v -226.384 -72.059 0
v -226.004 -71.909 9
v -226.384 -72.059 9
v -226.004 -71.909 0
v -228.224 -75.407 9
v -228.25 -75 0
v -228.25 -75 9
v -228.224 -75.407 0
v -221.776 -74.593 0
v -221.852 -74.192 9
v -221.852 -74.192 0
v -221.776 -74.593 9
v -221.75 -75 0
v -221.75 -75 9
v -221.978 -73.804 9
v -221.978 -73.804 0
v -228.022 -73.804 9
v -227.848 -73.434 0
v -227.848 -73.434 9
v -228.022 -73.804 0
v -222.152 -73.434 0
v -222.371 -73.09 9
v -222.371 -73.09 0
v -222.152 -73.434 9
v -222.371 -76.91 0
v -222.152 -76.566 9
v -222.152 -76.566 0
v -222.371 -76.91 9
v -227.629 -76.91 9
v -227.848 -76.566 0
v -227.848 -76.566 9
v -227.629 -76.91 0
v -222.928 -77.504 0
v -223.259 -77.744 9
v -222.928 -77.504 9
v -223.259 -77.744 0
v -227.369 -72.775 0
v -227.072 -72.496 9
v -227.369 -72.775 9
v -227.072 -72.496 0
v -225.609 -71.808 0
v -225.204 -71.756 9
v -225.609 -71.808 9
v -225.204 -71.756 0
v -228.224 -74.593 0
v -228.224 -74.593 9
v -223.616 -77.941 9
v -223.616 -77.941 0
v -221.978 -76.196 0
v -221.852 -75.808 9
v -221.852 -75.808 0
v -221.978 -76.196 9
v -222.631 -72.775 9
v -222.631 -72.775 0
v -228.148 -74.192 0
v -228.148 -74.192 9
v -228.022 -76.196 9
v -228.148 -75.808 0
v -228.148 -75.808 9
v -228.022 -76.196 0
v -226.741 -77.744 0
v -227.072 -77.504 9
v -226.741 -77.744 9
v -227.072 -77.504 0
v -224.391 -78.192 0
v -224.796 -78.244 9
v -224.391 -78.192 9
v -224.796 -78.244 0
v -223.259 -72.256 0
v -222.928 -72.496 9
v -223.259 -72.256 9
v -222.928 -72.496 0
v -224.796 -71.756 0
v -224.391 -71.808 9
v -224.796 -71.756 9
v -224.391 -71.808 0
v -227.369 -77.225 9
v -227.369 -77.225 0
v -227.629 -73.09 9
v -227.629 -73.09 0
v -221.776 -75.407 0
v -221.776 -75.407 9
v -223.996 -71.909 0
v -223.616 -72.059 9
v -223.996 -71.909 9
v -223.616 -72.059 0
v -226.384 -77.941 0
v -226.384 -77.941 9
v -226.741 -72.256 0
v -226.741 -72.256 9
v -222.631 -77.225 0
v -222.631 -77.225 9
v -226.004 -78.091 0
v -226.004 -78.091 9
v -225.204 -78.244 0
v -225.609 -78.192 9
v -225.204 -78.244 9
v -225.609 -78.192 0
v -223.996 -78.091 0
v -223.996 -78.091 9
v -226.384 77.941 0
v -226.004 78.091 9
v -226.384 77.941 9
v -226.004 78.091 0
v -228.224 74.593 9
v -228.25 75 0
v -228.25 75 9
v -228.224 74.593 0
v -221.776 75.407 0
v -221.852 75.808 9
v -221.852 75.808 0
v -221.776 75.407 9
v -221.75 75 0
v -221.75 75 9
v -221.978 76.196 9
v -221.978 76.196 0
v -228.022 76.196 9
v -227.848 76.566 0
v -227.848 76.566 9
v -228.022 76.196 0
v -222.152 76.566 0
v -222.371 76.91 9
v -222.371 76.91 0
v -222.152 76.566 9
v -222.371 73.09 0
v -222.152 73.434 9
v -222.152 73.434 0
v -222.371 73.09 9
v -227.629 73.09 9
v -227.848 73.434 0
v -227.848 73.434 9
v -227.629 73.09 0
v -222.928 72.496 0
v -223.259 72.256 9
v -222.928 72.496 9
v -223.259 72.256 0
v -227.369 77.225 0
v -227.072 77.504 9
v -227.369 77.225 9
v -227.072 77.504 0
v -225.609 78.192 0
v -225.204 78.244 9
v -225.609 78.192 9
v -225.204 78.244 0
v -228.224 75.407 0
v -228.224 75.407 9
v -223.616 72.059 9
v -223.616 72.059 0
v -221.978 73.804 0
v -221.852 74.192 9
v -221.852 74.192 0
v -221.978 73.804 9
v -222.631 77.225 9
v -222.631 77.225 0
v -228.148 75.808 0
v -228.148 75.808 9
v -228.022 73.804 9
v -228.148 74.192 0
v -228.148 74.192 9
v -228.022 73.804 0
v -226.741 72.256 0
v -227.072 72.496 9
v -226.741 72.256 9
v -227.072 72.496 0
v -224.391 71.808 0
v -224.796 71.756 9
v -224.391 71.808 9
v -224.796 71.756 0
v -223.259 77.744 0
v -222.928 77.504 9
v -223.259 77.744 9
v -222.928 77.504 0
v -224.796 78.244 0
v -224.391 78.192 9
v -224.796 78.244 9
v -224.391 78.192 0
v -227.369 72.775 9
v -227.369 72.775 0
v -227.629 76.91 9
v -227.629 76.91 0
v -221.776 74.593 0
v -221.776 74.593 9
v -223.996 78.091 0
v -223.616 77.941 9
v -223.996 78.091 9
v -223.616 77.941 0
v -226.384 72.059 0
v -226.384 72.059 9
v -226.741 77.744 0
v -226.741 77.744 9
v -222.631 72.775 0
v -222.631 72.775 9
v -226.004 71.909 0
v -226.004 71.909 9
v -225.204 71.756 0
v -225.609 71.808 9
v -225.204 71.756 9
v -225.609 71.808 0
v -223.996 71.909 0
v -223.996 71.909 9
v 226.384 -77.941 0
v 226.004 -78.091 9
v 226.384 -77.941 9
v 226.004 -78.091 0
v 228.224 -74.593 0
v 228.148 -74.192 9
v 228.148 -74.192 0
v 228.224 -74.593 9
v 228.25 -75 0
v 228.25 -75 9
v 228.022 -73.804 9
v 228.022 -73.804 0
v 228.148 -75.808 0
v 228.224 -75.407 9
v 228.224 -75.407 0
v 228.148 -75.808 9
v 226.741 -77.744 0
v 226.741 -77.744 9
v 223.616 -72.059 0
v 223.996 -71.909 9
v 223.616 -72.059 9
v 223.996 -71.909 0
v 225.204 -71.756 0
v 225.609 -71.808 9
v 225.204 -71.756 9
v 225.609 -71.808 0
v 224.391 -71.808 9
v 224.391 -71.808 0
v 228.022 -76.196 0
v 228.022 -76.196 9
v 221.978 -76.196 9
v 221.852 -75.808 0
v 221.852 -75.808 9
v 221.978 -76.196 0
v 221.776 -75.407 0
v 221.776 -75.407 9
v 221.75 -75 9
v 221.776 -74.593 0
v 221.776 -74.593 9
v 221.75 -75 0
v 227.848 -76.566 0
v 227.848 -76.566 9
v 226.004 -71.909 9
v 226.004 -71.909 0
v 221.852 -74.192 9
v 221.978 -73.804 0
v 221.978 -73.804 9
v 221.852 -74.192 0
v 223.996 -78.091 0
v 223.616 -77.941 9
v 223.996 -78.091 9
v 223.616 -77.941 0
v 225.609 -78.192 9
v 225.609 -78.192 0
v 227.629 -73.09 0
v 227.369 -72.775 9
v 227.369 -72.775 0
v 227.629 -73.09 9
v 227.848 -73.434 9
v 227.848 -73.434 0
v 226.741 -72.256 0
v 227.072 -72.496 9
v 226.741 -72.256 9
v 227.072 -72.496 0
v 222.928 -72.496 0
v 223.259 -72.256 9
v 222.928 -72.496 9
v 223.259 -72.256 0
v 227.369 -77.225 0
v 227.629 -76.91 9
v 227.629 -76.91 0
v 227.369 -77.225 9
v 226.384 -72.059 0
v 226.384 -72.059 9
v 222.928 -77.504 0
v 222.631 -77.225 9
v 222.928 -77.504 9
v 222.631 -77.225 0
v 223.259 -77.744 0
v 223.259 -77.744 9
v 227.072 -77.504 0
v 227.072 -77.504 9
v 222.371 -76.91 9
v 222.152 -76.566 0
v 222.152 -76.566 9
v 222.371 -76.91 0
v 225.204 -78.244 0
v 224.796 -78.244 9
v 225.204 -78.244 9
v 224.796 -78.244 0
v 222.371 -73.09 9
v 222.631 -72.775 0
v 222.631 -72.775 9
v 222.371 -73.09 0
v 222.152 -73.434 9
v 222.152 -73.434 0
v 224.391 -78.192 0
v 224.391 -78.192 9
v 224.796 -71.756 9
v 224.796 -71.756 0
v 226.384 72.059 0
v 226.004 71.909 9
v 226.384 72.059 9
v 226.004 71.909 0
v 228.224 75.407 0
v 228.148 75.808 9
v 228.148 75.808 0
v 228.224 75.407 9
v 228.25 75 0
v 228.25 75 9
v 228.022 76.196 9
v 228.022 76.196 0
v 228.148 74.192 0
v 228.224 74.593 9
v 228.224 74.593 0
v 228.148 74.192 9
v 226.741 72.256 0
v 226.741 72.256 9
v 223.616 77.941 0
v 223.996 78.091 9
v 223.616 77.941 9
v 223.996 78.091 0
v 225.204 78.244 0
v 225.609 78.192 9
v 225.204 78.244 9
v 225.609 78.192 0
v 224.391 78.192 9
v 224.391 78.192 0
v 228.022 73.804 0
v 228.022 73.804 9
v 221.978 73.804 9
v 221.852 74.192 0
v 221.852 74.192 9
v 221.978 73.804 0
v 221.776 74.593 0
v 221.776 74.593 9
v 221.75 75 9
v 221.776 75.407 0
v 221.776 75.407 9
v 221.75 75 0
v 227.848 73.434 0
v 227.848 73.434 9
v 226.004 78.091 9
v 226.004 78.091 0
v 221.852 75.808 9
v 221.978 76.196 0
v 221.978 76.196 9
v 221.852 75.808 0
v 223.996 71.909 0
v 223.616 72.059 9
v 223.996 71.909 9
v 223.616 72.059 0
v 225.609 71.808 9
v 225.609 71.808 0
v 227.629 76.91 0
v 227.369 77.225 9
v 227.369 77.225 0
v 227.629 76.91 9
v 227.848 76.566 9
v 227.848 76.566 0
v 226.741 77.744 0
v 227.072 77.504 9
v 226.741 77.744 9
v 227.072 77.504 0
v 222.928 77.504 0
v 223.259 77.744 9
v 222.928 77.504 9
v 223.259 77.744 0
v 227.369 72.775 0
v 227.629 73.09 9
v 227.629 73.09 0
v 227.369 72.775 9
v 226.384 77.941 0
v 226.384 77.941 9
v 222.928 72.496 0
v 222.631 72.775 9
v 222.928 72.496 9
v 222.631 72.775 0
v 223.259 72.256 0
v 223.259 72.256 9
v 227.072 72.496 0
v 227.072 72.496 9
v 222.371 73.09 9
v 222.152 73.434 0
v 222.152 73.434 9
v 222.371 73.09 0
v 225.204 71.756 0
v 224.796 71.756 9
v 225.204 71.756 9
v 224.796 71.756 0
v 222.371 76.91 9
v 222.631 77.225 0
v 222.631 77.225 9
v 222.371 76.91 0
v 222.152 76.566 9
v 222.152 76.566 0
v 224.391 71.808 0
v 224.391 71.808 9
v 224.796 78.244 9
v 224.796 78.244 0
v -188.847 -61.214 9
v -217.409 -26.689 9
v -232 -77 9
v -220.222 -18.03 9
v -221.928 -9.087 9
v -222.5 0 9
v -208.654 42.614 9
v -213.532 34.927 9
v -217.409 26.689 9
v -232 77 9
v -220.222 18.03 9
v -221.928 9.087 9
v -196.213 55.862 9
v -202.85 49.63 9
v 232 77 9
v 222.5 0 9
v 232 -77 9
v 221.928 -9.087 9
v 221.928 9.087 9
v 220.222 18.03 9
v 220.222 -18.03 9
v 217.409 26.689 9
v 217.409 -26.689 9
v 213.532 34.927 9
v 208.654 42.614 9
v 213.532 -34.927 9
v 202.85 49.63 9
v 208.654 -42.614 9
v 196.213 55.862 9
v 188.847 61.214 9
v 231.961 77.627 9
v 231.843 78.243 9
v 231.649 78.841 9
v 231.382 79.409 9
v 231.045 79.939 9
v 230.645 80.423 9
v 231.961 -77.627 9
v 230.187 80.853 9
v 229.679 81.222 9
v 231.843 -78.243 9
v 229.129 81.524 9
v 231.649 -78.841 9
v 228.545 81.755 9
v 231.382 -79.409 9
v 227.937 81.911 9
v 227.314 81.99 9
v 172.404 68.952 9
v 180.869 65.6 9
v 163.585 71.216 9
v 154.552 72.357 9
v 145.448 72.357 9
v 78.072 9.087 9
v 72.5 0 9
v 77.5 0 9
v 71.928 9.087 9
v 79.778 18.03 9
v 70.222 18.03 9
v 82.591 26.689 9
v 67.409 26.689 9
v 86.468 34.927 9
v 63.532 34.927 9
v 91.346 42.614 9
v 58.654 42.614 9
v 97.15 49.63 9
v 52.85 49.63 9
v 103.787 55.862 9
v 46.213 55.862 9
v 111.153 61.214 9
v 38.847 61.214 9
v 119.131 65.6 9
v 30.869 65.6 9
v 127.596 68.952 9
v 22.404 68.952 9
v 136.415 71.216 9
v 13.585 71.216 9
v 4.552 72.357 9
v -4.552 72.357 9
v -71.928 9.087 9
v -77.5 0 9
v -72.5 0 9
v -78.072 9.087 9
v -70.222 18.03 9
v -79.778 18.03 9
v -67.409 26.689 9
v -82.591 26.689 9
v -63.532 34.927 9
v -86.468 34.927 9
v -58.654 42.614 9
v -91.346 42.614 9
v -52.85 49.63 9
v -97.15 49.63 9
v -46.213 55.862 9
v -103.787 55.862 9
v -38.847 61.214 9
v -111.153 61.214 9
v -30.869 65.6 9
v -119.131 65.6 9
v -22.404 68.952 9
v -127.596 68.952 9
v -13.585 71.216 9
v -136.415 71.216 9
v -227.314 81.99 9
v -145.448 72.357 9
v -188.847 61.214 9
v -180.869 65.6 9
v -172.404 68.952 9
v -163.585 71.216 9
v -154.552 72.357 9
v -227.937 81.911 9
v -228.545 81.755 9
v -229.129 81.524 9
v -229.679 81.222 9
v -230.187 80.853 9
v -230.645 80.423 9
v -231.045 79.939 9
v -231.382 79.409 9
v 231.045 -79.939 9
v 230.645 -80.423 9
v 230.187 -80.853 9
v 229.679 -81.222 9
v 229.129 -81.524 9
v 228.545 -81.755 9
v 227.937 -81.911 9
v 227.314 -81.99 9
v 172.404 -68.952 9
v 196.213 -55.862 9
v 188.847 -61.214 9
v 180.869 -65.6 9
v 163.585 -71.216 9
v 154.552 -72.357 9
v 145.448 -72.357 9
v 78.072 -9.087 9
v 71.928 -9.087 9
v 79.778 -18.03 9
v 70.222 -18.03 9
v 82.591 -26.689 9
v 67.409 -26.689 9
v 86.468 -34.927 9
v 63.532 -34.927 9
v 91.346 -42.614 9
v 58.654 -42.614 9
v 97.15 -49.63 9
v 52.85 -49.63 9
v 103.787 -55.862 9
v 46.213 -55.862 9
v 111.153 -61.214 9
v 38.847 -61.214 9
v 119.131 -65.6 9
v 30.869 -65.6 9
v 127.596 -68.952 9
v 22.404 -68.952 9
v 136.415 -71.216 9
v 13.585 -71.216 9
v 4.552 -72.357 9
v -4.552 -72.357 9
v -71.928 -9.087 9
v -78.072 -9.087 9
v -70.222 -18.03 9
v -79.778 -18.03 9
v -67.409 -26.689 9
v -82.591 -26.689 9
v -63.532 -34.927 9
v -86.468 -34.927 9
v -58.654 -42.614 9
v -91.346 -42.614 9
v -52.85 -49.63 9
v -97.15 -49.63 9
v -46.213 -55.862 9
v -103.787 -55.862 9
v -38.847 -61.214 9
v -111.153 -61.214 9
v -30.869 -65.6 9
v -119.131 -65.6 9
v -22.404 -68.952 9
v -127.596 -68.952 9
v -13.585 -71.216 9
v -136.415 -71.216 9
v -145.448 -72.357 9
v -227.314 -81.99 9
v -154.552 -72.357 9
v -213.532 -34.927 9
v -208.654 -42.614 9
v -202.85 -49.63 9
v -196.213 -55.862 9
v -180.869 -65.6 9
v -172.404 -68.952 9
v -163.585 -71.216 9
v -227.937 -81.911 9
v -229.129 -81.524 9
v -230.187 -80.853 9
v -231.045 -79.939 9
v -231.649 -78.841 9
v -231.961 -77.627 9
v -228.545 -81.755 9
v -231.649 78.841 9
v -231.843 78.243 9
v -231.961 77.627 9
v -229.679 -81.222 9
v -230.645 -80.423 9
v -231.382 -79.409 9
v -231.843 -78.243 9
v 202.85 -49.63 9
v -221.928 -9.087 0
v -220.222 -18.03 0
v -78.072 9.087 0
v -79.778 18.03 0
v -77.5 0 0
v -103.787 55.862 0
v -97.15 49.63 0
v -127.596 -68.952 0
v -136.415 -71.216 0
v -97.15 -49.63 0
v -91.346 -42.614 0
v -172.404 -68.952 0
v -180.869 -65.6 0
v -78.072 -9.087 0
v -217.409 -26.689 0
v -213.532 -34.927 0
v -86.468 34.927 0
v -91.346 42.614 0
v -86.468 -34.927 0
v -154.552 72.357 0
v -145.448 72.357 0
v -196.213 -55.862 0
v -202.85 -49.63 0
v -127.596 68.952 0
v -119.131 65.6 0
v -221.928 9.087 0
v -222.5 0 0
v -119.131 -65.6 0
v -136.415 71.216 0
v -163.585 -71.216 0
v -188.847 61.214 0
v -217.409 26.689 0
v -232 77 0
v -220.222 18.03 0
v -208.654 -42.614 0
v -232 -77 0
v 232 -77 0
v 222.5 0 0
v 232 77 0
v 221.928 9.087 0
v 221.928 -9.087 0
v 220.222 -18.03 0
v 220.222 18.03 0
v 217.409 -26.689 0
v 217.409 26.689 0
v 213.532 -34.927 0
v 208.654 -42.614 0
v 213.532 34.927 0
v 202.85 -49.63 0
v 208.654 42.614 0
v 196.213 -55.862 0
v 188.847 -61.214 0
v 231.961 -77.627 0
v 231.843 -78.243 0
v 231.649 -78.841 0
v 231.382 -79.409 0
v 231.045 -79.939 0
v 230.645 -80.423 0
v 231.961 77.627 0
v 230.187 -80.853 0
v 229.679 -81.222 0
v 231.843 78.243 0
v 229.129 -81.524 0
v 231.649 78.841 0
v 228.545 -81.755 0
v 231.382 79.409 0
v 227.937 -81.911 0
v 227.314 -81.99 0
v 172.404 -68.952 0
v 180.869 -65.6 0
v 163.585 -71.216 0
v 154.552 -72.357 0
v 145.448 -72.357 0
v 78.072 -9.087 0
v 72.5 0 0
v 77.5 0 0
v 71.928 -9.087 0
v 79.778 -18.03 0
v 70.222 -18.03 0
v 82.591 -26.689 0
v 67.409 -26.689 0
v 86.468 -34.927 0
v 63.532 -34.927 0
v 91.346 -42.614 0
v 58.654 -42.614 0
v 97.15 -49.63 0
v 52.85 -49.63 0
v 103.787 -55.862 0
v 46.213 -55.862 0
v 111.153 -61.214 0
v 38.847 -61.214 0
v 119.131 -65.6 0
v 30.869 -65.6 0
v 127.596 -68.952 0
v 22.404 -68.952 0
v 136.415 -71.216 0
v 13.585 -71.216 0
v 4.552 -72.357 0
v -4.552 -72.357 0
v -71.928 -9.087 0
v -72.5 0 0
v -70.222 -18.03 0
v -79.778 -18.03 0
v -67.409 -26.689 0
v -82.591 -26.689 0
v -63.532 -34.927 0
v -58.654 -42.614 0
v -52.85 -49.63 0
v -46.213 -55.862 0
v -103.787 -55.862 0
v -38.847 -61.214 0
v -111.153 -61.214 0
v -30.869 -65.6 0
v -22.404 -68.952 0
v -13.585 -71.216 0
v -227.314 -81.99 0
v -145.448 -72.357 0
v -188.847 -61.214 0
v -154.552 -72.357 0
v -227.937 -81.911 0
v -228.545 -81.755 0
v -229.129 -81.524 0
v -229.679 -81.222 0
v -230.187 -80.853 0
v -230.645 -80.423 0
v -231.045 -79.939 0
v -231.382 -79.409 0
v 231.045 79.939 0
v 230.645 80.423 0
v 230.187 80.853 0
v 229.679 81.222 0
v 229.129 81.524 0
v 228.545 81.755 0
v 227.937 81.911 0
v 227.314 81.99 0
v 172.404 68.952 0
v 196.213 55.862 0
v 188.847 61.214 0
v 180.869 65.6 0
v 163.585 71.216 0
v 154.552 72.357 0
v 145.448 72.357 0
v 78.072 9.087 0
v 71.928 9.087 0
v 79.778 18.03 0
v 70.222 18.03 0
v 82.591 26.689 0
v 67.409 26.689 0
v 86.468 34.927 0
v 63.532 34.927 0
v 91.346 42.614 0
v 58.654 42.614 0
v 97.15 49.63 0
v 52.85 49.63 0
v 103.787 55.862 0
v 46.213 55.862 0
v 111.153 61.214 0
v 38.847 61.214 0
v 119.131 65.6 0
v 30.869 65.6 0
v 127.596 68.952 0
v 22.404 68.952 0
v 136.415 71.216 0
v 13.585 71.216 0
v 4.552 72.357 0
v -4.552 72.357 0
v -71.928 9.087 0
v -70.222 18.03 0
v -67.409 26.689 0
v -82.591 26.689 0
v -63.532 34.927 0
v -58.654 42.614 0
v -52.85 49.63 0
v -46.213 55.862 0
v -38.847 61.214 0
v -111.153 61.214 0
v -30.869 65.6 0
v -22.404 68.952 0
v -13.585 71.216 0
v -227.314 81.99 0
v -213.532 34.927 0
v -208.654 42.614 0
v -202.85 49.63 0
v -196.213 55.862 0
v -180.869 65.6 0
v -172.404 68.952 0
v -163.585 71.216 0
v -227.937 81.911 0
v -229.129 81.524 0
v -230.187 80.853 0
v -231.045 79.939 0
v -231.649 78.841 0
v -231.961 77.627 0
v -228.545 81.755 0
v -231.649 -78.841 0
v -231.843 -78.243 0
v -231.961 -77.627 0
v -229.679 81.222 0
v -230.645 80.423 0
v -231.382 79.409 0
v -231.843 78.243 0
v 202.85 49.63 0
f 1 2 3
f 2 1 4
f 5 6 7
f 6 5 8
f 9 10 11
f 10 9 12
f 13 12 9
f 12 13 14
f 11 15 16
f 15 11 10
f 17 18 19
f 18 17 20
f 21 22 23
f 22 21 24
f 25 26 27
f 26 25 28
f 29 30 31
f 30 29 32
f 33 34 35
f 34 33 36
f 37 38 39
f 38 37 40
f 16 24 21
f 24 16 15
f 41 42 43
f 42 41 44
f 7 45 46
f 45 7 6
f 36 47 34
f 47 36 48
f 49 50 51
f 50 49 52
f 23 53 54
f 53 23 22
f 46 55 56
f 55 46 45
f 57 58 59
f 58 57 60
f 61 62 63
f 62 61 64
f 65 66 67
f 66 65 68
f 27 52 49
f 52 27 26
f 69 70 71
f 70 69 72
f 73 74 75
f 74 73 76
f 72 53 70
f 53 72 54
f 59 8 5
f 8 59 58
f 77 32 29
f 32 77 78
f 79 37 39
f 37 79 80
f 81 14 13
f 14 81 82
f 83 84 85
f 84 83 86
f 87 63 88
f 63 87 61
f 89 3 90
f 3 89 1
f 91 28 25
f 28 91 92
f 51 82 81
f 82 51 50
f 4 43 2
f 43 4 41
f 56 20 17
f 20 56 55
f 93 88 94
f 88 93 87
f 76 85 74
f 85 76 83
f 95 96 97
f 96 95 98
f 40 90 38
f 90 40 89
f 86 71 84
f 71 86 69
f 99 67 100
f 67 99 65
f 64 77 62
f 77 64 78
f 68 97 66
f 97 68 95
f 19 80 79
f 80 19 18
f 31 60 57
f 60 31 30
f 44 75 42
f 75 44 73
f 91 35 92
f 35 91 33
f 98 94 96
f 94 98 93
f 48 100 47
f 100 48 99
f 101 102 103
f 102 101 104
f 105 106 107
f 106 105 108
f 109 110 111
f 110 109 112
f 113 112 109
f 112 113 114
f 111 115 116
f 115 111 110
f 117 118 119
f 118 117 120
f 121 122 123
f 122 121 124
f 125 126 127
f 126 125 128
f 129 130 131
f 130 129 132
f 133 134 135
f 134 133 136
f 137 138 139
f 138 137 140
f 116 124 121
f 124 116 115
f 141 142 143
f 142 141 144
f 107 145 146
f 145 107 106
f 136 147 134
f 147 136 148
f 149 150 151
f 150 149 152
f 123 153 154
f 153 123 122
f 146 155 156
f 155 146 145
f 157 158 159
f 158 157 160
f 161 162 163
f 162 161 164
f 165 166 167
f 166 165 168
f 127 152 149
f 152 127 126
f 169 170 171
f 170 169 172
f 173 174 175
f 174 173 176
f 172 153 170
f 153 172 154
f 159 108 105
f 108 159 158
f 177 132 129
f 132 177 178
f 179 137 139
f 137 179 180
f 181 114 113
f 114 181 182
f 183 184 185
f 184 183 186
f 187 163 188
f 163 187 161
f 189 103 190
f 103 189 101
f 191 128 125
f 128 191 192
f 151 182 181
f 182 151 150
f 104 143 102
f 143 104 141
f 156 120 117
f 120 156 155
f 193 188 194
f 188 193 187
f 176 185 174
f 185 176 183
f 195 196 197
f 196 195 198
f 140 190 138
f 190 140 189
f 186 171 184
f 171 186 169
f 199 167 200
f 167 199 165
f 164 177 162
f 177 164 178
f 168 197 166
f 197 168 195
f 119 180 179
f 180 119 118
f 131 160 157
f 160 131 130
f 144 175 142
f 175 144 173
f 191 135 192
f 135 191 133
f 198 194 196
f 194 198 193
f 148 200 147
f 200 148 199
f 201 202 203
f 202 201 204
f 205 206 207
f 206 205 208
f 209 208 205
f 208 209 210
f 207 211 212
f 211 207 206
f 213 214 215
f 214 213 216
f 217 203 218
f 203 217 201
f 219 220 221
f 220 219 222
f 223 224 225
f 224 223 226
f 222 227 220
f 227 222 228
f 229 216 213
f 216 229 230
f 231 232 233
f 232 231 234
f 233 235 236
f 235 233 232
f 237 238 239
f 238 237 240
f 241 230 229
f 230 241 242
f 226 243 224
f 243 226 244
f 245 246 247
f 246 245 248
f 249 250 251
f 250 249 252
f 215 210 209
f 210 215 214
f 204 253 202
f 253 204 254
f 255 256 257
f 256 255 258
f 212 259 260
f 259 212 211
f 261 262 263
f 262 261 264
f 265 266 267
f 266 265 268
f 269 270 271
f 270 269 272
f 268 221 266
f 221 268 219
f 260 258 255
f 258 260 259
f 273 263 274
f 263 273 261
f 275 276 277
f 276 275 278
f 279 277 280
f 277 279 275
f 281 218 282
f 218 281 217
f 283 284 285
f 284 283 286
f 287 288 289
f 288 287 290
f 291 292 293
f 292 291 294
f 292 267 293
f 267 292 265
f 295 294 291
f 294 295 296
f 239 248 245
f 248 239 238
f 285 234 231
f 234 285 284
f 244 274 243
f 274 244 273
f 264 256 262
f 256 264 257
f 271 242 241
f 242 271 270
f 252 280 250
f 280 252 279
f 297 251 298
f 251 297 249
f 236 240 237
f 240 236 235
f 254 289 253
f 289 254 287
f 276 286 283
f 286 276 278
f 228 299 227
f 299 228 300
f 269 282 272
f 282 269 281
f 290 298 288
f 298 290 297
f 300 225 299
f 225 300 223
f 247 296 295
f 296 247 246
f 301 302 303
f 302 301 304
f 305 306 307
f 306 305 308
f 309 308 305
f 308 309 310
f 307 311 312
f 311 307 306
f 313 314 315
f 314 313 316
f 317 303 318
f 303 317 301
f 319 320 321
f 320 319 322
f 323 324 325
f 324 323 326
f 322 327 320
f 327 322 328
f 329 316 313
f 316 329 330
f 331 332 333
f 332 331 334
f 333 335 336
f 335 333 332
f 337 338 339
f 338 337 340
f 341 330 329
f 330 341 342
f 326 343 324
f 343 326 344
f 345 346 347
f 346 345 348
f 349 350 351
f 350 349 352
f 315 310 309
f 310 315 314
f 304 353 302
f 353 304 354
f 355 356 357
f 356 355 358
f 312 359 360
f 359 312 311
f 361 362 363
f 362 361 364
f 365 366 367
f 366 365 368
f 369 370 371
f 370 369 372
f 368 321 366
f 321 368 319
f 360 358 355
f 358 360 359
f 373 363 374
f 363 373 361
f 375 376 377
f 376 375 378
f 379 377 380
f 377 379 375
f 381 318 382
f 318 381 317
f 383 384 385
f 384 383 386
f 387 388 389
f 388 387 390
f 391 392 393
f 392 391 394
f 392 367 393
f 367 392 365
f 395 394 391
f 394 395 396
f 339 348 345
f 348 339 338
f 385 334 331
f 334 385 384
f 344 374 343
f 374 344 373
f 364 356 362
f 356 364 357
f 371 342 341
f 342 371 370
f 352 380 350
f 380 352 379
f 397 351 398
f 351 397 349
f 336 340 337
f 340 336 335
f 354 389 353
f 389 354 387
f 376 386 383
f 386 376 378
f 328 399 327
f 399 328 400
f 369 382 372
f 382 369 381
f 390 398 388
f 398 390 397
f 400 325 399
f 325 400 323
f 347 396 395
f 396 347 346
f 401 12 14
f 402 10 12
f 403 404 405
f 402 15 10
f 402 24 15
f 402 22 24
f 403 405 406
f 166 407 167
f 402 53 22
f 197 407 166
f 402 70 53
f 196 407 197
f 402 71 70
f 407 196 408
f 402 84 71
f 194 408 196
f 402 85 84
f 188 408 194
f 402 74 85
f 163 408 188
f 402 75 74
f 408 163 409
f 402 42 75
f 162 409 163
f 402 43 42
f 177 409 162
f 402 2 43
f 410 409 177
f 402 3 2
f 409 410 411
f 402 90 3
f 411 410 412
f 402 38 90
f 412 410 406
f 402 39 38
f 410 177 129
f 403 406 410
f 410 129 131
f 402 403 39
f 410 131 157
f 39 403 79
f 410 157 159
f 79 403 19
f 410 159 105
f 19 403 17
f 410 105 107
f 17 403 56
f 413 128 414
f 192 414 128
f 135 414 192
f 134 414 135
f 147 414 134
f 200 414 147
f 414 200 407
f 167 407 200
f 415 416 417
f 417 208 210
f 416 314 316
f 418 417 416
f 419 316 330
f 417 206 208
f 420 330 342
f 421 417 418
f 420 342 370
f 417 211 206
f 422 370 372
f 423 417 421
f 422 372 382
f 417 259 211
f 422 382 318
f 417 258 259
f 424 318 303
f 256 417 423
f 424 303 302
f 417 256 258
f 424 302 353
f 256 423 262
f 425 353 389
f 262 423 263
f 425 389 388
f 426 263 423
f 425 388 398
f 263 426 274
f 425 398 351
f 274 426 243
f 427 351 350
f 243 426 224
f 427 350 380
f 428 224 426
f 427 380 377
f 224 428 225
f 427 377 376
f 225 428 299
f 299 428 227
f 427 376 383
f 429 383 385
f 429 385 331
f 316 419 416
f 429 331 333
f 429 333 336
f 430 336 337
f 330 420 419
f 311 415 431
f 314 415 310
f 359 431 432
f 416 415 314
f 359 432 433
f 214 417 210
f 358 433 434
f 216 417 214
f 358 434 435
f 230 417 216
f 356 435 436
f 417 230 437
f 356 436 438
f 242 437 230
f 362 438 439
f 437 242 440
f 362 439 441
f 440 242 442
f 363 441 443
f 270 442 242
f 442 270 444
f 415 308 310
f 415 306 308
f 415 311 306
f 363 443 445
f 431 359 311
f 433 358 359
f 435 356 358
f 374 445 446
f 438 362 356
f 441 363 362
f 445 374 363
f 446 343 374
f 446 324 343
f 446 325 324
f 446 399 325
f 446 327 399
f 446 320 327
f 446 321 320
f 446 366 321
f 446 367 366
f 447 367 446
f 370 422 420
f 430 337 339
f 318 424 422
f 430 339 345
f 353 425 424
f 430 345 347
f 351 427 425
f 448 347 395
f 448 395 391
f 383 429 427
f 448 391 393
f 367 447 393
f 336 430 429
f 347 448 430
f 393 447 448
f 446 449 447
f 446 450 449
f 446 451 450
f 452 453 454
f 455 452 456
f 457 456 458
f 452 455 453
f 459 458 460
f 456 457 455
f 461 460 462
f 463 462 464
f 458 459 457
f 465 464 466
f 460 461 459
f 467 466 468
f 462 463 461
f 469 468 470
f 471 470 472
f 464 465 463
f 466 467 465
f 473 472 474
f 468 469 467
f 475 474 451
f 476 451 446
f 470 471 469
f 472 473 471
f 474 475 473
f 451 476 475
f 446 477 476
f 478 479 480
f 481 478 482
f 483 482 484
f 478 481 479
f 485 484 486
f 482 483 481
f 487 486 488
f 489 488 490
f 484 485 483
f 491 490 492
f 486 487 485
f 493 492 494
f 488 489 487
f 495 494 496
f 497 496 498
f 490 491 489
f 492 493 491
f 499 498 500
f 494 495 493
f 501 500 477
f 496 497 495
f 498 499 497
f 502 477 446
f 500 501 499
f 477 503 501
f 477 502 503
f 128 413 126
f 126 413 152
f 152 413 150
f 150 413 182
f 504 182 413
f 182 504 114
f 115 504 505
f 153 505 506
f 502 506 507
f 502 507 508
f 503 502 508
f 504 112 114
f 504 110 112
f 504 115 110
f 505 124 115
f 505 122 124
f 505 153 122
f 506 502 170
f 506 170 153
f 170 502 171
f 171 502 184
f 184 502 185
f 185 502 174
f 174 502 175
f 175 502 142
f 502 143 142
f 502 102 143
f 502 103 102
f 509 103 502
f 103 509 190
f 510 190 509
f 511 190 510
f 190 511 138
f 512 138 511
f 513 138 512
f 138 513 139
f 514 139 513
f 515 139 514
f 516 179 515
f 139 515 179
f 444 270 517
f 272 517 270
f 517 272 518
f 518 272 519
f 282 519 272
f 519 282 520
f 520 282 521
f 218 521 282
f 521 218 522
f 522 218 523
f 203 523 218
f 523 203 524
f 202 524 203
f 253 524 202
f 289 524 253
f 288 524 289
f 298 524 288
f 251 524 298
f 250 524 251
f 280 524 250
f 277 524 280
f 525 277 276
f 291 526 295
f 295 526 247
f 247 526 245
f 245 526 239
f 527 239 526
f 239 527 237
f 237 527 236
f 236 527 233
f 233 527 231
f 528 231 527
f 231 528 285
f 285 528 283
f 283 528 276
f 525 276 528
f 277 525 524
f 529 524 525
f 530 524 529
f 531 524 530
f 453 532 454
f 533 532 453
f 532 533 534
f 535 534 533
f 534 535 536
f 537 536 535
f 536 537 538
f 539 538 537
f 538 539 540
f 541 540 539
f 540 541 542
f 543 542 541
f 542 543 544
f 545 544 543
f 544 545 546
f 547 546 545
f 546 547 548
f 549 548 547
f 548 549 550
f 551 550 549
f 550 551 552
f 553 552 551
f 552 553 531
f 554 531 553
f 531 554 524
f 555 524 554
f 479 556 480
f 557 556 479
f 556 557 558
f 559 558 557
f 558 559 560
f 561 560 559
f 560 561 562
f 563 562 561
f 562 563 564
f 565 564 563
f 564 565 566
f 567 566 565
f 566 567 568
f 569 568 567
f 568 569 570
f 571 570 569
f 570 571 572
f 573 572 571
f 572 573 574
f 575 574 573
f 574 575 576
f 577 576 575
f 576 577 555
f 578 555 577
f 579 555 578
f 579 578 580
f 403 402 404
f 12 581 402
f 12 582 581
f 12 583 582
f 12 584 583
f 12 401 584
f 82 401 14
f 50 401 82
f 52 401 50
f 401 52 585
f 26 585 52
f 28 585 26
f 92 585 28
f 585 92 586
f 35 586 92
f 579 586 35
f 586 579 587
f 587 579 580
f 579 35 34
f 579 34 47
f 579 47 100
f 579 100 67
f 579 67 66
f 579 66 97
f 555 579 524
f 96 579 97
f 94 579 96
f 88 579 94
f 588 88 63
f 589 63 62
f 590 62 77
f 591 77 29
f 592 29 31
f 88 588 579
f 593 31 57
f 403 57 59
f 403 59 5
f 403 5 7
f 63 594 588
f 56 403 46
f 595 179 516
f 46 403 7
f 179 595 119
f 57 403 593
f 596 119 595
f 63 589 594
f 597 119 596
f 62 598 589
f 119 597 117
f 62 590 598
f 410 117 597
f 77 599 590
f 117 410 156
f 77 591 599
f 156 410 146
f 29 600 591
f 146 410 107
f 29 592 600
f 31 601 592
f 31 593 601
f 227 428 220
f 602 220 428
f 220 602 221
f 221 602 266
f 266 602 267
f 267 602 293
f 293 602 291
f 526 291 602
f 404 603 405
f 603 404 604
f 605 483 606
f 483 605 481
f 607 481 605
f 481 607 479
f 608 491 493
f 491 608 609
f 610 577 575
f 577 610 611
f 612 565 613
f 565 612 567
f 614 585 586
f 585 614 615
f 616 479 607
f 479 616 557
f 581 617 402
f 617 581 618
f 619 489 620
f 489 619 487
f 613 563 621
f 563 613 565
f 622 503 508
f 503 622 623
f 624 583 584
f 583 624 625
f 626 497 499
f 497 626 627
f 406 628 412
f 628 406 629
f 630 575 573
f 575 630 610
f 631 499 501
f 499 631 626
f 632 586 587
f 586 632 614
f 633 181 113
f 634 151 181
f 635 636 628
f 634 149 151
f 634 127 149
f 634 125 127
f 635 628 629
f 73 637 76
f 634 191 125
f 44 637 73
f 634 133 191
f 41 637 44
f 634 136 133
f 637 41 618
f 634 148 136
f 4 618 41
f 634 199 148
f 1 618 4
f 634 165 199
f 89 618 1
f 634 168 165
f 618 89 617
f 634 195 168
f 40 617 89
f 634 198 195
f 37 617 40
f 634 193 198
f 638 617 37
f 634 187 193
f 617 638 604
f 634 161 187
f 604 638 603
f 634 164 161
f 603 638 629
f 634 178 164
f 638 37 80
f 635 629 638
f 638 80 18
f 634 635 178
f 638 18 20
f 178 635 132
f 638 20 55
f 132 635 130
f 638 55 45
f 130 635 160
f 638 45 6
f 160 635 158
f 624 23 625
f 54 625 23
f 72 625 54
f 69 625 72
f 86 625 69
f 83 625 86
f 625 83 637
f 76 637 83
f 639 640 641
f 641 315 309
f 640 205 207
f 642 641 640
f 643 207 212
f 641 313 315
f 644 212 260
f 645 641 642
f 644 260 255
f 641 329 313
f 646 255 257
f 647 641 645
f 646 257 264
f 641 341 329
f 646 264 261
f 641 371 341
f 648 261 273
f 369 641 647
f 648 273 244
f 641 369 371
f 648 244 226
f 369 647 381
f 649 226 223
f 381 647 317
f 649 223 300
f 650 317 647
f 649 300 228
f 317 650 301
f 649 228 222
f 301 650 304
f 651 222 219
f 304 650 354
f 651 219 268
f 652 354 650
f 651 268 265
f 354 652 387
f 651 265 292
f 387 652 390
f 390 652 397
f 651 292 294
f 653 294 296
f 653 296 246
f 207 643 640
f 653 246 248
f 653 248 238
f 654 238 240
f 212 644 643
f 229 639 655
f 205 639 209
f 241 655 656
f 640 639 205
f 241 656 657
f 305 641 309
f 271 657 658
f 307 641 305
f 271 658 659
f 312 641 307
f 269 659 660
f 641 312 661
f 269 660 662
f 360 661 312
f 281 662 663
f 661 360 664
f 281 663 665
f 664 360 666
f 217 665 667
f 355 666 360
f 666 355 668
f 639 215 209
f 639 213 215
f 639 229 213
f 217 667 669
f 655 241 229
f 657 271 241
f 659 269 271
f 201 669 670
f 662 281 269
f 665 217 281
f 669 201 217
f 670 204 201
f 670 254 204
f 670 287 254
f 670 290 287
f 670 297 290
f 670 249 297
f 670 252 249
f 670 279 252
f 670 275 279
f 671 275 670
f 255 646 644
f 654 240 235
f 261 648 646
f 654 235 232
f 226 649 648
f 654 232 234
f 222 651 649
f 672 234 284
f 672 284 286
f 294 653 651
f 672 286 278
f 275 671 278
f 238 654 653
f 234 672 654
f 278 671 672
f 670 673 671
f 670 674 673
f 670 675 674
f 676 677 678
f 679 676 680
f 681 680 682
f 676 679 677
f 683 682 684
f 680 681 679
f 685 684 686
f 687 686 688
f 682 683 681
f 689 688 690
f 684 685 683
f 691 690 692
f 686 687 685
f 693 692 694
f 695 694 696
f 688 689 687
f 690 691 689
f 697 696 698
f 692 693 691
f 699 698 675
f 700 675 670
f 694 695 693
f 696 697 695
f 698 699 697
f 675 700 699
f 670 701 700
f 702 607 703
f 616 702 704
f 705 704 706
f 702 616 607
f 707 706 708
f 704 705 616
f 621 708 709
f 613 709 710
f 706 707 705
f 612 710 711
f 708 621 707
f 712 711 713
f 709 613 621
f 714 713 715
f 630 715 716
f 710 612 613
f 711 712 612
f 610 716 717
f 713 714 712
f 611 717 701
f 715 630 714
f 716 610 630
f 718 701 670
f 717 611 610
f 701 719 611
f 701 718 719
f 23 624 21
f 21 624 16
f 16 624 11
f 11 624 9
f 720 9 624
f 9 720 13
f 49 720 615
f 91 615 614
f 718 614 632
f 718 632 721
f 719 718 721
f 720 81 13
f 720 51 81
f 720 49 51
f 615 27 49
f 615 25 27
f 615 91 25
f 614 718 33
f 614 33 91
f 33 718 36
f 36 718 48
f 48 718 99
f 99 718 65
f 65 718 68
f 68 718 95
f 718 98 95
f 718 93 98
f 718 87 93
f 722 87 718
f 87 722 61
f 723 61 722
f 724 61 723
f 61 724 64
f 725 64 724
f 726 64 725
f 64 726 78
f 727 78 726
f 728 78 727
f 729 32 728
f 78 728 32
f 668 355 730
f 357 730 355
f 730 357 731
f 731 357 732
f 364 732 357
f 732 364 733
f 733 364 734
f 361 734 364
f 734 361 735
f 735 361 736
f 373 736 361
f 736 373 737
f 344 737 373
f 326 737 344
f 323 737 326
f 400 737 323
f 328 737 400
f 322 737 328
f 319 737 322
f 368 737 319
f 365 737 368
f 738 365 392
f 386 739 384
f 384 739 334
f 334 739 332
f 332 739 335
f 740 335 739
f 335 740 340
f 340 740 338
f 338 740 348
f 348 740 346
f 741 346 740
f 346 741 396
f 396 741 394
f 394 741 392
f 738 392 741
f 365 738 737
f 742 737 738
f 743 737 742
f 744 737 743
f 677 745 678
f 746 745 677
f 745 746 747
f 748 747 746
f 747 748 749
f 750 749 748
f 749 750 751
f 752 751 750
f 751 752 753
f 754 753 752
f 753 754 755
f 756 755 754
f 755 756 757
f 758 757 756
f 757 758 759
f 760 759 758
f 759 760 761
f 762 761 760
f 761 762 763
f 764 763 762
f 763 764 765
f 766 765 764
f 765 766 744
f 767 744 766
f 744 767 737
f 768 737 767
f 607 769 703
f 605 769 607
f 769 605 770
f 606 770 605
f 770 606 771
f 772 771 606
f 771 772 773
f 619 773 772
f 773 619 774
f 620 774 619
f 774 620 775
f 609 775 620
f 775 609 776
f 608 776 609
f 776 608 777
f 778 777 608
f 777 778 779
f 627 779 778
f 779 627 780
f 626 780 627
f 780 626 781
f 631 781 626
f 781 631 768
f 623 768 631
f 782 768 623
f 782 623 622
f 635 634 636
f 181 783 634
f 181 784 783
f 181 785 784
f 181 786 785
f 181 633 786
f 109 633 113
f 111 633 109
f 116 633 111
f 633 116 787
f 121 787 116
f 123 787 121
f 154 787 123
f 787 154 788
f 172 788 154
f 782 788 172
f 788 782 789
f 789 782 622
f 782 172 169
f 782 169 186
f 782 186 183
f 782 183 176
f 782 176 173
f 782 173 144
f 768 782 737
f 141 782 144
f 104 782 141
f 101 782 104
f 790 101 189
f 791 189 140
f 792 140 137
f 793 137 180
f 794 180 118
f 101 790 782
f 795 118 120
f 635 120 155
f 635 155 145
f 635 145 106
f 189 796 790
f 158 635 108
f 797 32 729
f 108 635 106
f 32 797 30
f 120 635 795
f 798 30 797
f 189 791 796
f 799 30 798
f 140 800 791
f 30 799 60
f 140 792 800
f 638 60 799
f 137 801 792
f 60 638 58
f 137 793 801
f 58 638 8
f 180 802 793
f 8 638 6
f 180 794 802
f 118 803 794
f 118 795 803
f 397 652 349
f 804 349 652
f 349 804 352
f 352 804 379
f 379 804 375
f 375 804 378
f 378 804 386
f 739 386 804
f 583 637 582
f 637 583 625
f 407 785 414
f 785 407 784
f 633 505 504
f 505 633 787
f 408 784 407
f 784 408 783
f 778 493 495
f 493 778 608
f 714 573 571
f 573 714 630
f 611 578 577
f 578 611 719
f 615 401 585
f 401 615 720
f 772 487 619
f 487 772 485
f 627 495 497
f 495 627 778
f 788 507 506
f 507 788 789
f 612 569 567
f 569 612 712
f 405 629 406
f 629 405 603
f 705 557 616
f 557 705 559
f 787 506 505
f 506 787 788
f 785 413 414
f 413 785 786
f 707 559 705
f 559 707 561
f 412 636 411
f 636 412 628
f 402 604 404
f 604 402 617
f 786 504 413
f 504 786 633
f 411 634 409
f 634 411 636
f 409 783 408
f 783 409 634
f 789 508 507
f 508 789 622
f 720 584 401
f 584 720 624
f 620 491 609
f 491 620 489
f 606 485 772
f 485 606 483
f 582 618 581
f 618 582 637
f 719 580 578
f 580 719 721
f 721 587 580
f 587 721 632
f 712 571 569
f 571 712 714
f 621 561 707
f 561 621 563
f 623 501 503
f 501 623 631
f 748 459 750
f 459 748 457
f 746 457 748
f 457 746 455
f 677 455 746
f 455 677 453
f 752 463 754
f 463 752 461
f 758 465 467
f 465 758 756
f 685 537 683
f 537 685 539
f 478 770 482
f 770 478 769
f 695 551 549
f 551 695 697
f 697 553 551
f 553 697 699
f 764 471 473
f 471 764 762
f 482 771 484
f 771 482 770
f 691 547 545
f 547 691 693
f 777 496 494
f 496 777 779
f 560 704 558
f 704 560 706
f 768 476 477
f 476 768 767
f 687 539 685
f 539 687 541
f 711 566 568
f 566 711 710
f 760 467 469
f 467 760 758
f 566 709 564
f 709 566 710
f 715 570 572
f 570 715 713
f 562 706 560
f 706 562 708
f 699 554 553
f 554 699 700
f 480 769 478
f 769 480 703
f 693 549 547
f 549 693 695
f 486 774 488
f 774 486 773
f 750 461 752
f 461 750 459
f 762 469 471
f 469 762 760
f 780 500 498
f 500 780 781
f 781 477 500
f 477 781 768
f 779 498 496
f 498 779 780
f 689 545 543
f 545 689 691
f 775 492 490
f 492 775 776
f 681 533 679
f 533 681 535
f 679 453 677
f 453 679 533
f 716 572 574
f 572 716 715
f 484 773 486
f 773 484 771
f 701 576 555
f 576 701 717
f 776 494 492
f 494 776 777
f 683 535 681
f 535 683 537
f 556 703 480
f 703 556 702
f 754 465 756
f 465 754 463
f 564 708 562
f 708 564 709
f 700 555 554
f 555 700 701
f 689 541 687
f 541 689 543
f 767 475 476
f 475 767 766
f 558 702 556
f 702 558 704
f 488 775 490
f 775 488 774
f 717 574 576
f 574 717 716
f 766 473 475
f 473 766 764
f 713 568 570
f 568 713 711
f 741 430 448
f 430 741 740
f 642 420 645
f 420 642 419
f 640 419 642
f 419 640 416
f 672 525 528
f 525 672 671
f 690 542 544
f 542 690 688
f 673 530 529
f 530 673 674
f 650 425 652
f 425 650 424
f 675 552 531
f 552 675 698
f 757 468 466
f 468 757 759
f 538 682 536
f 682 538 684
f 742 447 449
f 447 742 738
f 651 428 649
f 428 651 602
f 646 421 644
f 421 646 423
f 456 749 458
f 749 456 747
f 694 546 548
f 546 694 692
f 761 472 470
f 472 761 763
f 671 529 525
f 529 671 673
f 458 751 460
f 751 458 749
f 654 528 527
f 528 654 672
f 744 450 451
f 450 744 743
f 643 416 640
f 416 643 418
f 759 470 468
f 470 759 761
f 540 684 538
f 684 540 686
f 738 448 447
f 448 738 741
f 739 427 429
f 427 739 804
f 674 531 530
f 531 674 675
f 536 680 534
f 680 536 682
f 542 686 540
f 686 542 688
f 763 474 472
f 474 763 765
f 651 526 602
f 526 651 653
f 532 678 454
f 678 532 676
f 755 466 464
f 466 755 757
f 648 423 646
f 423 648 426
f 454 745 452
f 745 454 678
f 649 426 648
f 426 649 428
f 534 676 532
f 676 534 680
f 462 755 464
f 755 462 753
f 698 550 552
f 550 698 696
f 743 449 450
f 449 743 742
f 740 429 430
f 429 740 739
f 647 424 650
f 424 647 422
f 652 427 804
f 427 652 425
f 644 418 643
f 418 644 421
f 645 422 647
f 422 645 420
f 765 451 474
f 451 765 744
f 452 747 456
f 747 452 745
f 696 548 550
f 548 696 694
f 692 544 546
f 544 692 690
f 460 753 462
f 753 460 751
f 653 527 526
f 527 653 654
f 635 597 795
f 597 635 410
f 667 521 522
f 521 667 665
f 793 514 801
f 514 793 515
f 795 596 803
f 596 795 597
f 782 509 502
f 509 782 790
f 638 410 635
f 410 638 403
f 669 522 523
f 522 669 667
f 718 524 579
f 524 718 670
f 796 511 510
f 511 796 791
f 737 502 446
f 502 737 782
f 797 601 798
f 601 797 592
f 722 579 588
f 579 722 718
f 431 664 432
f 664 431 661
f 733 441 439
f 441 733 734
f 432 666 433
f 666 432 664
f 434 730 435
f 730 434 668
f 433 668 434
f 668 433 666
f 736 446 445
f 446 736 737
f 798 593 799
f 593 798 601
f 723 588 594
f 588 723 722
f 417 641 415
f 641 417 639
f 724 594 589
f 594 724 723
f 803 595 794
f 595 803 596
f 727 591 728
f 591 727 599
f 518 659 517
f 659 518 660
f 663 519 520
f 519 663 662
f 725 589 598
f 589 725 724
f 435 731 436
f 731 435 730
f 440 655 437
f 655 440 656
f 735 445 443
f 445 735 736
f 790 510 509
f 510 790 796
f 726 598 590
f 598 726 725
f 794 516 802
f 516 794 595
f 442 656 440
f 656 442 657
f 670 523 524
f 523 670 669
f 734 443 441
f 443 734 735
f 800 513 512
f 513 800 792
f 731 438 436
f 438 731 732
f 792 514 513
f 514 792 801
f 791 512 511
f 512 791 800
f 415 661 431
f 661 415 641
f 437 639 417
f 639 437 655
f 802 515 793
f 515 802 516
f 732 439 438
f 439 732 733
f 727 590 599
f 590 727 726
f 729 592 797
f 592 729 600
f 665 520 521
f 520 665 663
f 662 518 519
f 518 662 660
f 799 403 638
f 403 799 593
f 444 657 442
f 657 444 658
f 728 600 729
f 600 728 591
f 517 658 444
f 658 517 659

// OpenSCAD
$fn = 50;


difference() {
	union() {
		hull() {
			translate(v = [-227.0000000000, 77.0000000000, 0]) {
				cylinder(h = 9, r = 5);
			}
			translate(v = [227.0000000000, 77.0000000000, 0]) {
				cylinder(h = 9, r = 5);
			}
			translate(v = [-227.0000000000, -77.0000000000, 0]) {
				cylinder(h = 9, r = 5);
			}
			translate(v = [227.0000000000, -77.0000000000, 0]) {
				cylinder(h = 9, r = 5);
			}
		}
	}
	union() {
		#translate(v = [-225.0000000000, -75.0000000000, -100.0000000000]) {
			cylinder(h = 200, r = 3.2500000000);
		}
		#translate(v = [-225.0000000000, 75.0000000000, -100.0000000000]) {
			cylinder(h = 200, r = 3.2500000000);
		}
		#translate(v = [225.0000000000, -75.0000000000, -100.0000000000]) {
			cylinder(h = 200, r = 3.2500000000);
		}
		#translate(v = [225.0000000000, 75.0000000000, -100.0000000000]) {
			cylinder(h = 200, r = 3.2500000000);
		}
		#translate(v = [-150.0000000000, 0, 0]) {
			cylinder(h = 9, r = 72.5000000000);
		}
		#cylinder(h = 9, r = 72.5000000000);
		#translate(v = [150.0000000000, 0, 0]) {
			cylinder(h = 9, r = 72.5000000000);
		}
	}
}
